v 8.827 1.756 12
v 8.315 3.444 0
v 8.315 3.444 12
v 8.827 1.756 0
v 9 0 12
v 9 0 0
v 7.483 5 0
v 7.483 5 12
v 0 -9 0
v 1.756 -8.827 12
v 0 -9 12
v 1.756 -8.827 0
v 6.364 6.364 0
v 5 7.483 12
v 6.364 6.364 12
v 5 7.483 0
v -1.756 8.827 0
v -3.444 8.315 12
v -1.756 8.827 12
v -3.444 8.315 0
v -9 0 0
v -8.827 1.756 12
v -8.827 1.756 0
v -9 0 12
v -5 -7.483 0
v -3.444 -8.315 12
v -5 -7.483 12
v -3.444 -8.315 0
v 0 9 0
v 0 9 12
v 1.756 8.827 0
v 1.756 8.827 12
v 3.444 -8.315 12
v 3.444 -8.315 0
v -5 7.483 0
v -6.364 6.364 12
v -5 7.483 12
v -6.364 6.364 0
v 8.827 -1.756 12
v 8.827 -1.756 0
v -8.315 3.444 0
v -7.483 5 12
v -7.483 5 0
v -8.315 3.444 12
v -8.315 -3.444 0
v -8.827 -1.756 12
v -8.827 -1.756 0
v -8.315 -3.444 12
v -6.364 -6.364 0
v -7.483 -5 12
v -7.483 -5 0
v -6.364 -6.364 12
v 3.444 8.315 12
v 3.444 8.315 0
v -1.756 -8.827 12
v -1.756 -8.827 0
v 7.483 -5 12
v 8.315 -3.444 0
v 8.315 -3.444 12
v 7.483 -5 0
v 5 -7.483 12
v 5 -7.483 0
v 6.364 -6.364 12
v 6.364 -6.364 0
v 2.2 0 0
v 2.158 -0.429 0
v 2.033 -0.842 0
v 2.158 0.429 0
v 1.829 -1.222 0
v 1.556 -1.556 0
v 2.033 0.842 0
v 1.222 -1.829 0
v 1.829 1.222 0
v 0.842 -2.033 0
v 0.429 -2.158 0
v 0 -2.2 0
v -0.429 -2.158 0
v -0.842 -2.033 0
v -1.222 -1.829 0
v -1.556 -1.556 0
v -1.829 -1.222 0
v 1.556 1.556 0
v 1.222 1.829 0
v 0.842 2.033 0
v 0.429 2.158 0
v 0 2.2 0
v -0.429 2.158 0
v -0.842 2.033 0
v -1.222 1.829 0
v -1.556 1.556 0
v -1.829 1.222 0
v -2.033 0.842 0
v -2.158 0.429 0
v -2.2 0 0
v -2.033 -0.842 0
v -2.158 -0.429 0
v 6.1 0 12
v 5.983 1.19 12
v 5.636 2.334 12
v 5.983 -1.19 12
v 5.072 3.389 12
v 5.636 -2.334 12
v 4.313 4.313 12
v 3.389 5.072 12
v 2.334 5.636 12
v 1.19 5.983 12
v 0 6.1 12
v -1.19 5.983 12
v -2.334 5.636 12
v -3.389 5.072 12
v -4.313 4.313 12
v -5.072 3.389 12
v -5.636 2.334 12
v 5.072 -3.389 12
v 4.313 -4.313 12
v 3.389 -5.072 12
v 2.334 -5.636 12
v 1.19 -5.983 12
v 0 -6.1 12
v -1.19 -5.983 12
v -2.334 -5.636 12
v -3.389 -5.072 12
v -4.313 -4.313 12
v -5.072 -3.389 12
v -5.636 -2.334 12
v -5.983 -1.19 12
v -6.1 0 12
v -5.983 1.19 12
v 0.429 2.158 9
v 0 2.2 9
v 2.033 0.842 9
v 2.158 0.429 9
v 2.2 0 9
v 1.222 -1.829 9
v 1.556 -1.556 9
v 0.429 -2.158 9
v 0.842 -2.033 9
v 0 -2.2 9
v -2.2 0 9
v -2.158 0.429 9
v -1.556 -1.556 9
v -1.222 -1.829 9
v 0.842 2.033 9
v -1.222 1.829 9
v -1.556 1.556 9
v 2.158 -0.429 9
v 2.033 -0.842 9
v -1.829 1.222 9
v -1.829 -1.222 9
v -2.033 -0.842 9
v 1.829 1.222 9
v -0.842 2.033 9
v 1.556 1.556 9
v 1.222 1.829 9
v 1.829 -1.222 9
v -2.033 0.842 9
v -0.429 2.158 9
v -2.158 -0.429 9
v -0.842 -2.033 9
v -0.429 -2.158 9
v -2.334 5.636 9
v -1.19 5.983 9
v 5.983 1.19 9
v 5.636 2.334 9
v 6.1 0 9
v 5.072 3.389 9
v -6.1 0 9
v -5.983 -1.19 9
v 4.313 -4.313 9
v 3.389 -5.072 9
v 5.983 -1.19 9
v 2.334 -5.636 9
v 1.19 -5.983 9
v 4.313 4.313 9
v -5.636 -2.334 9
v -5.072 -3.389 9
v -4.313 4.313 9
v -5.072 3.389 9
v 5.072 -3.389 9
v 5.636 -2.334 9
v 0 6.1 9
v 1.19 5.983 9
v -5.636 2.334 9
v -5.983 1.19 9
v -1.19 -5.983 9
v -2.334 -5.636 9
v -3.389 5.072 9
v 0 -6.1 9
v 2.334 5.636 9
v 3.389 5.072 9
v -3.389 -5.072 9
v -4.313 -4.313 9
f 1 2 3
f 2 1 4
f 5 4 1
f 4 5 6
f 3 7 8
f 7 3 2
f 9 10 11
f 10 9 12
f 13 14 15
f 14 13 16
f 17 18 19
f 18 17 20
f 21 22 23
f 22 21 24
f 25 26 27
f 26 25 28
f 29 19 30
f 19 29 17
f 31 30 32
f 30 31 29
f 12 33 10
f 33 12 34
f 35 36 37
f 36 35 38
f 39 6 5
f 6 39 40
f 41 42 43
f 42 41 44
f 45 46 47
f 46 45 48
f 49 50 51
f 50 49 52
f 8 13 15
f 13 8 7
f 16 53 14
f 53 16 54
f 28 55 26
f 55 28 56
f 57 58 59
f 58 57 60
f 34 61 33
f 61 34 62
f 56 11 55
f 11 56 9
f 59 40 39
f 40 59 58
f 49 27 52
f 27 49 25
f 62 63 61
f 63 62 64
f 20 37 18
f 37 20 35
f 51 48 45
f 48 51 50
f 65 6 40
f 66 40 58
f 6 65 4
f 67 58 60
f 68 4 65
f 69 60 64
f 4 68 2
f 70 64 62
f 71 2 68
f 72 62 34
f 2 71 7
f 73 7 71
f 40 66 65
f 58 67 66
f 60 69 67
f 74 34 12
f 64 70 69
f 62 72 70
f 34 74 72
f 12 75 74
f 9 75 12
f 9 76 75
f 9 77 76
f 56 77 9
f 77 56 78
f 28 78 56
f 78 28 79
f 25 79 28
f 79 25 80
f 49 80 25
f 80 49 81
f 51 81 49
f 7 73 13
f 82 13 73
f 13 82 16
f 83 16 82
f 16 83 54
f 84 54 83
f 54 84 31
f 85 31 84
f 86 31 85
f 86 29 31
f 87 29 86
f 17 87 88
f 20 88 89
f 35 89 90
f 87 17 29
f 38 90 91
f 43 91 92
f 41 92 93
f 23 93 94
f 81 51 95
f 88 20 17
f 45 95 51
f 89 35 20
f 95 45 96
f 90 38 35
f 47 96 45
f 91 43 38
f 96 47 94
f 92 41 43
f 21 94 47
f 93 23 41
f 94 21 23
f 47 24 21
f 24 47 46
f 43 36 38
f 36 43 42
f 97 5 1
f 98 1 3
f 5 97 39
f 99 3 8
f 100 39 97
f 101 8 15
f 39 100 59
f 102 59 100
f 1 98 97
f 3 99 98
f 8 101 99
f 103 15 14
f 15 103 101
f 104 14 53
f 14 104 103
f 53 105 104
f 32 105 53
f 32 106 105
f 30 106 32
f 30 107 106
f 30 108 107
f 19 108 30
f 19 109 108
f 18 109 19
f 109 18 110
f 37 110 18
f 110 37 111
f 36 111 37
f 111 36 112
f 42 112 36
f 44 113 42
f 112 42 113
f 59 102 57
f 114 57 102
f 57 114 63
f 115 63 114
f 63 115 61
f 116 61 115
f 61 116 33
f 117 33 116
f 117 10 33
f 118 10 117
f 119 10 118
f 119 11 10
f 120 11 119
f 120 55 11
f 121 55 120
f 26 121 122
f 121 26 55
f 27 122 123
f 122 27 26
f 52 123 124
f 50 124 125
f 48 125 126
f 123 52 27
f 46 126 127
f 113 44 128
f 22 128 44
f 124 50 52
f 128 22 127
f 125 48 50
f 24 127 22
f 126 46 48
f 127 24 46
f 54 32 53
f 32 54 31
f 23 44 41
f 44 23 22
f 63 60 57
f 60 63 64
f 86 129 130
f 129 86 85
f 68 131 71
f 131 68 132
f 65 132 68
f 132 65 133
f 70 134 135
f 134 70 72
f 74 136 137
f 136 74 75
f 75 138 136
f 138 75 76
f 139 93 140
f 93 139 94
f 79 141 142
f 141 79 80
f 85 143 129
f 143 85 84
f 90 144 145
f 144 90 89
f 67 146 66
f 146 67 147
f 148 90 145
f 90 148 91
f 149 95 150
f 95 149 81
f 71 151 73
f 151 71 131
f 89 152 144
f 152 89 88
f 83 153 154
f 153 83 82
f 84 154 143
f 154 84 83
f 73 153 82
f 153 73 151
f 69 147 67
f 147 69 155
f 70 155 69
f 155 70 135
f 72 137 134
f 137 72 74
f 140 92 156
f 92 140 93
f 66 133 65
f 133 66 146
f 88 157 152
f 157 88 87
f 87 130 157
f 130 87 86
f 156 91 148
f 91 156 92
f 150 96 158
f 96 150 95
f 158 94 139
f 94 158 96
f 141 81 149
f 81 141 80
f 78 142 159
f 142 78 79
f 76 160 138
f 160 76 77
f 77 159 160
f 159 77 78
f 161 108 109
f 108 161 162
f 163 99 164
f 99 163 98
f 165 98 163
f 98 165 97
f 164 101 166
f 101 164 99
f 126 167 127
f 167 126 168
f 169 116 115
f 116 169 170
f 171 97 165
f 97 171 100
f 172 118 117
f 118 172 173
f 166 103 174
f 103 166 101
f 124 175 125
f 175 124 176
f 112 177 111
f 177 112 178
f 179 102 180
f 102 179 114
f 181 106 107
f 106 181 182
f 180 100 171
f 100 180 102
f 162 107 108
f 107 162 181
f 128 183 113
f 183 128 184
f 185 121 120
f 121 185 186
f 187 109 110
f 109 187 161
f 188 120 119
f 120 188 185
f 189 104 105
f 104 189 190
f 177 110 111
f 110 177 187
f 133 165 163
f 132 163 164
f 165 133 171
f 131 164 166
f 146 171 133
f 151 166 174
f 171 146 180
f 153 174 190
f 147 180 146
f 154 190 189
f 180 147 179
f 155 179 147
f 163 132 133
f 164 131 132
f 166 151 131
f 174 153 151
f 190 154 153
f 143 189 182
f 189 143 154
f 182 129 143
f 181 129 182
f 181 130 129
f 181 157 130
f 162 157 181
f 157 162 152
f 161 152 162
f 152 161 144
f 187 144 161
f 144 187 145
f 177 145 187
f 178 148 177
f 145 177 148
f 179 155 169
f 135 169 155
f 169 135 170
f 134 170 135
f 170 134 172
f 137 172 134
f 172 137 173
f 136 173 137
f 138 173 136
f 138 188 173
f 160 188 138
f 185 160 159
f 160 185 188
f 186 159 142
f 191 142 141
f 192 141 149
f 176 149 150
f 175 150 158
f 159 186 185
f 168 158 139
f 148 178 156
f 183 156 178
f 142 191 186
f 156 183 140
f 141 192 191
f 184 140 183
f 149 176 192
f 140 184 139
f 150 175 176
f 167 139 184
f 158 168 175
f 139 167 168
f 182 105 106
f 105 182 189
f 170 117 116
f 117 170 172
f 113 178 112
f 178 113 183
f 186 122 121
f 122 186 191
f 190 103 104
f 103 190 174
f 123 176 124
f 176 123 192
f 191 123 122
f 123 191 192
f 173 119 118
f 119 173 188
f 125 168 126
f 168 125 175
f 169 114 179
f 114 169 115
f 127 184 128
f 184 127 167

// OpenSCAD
$fn=32;

height=12;
main_size=18;
rod_d=4.4;
magnet_d=12.2;
magnet_h=3;

difference() {
    cylinder(h=height,d=main_size);
    translate([0,0,-1])
        cylinder(h=height*2,d=rod_d);
    translate([0,0,height-magnet_h])
        cylinder(h=magnet_h+1,d=magnet_d);
}
